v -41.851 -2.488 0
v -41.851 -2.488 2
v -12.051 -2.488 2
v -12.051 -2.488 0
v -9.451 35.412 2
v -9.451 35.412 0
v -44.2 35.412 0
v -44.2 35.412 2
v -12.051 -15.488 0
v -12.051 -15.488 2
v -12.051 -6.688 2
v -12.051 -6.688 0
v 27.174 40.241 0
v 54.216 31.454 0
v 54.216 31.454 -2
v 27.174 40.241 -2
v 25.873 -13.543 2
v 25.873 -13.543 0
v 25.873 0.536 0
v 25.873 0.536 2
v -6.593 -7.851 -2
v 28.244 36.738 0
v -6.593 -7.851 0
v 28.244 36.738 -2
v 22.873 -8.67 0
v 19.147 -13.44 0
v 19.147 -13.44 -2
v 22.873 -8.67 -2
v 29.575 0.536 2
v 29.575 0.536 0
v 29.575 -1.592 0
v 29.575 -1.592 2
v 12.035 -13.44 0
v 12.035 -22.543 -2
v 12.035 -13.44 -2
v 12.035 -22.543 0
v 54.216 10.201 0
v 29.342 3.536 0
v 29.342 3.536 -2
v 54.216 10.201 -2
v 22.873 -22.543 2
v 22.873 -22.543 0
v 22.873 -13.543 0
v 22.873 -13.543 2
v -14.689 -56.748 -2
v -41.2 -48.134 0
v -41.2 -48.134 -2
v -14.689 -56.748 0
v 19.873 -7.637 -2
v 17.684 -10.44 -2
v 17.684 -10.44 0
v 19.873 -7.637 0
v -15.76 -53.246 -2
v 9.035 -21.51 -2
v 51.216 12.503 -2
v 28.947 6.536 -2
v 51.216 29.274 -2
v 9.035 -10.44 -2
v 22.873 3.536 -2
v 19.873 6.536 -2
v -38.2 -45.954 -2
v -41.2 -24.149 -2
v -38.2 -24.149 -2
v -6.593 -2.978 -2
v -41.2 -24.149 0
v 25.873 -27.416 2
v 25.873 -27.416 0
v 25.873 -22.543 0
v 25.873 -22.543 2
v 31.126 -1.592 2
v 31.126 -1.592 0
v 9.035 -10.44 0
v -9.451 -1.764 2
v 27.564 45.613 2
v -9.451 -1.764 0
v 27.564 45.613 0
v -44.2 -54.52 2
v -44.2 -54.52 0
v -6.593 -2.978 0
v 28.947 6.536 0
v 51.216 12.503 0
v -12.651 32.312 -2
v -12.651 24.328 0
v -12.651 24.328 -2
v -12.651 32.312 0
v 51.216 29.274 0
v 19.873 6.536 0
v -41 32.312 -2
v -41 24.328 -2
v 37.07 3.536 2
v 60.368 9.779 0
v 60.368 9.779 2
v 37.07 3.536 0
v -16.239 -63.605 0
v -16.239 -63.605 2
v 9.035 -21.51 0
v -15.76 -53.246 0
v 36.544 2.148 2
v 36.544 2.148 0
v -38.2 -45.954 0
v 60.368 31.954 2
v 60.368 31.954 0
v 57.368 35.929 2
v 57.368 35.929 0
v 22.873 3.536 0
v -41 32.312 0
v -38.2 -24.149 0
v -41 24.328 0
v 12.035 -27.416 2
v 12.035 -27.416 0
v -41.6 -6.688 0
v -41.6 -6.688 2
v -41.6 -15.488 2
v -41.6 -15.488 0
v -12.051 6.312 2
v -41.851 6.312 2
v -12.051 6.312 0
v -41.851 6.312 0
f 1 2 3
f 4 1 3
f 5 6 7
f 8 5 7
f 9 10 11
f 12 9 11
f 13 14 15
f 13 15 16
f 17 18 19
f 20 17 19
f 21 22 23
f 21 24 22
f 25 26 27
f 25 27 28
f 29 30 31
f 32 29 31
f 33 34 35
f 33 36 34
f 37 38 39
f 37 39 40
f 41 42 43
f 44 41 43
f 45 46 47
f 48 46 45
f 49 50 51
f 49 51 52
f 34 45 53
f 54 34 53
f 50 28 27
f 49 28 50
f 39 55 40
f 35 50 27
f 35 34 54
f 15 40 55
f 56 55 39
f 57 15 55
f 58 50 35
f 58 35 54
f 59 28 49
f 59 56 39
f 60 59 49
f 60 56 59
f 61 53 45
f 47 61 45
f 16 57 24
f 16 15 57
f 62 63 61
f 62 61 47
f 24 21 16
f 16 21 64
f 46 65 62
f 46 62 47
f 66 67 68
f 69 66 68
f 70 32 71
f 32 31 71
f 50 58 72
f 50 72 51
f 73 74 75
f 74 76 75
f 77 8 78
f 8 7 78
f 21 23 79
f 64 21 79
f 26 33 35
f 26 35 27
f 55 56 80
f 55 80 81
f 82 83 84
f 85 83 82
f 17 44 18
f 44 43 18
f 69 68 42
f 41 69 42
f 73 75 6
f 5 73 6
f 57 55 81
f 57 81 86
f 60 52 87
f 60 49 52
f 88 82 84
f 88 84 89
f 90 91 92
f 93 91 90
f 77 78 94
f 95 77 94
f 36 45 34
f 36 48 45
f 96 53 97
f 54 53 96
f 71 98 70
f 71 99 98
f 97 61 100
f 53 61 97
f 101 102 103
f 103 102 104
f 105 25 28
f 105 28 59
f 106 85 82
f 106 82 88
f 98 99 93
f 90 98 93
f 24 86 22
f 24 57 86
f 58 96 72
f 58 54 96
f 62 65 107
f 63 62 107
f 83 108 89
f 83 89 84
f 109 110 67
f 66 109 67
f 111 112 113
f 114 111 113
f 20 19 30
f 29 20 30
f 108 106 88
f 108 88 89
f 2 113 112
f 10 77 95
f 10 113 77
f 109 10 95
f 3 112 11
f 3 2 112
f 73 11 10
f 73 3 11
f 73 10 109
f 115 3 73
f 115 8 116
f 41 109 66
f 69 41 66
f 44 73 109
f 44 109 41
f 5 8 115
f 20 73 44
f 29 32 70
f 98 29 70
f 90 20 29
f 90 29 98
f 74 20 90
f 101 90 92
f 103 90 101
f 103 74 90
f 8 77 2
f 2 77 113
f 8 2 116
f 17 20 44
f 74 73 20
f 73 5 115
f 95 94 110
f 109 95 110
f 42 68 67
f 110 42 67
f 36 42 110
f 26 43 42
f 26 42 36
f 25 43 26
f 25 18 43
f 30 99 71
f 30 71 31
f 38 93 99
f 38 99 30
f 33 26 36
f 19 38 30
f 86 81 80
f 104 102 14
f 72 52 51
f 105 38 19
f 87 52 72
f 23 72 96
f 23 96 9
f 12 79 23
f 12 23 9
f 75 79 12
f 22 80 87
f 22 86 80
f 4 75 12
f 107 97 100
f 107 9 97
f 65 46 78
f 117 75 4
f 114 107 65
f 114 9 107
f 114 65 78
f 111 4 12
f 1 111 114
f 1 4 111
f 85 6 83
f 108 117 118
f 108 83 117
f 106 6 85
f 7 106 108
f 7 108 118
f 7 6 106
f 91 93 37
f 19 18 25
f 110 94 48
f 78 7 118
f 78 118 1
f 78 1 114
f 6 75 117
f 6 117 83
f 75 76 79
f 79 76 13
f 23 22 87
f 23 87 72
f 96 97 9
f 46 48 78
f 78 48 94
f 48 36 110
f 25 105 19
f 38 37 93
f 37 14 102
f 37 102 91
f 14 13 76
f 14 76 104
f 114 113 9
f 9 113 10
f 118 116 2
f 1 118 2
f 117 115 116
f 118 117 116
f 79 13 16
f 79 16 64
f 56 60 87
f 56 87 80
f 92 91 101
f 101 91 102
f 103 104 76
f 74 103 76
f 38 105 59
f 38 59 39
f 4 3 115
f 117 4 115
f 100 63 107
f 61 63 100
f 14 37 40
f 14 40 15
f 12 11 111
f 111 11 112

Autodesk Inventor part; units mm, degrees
ref_plane "YZ Plane" through (0, 0, 0) normal (1, 0, 0) x (0, 1, 0)
ref_plane "XZ Plane" through (0, 0, 0) normal (0, 1, 0) x (-1, 0, 0)
ref_plane "XY Plane" through (0, 0, 0) normal (0, 0, 1) x (1, 0, 0)
ref_plane "Work Plane1" through (0, 0, 0) normal (0, 0, 1) x (1, 0, 0)
sketch "Sketch1" plane through (0, 0, 0) normal (0, 0, 1) x (1, 0, 0)
  line L0 (29.3421, 3.5361) -> (54.2162, 10.2011) projected
  line L1 (29.3421, 3.5361) -> (22.8734, 3.5361) projected
  line L2 (22.8734, 3.5361) -> (22.8734, -8.6704) projected
  line L3 (22.8734, -8.6704) -> (19.1468, -13.4402) projected
  line L4 (19.1468, -13.4402) -> (12.0348, -13.4402) projected
  line L5 (12.0348, -13.4402) -> (12.0348, -22.5432) projected
  line L6 (12.0348, -22.5432) -> (-14.689, -56.7481) projected
  line L7 (-14.689, -56.7481) -> (-41.2, -48.1342) projected
  line L8 (-41.2, -48.1342) -> (-41.2, -18.0876) projected
  line L9 (-41.2, -7.0876) -> (-38.2, -7.0876) projected
  line L10 (-38.2, -7.0876) -> (-38.2, -2.0876) projected
  line L11 (-38.2, -2.0876) -> (-41.4512, -2.0876) projected
  line L12 (-41.4512, -2.0876) -> (-41.4512, 5.4124) construction
  line L13 (-41.4512, 5.4124) -> (-41.2, 5.4124) construction
  line L14 (-41.2, 5.4124) -> (-41.2, 5.9124) construction
  line L15 (-41.2, 5.9124) -> (-38.2, 5.9124) projected
  line L16 (-38.2, 5.9124) -> (-38.2, 8.4124) projected
  line L17 (-38.2, 8.4124) -> (-41.2, 8.4124) projected
  line L18 (-41.2, 8.4124) -> (-41.2, 32.4124) projected
  line L19 (-41.2, 32.4124) -> (-12.4512, 32.4124) projected
  line L20 (-12.4512, 32.4124) -> (-12.4512, 8.4124) projected
  line L21 (-12.4512, 8.4124) -> (-15.4512, 8.4124) projected
  line L22 (-15.4512, 8.4124) -> (-15.4512, 5.9124) projected
  line L23 (-15.4512, 5.9124) -> (-12.4512, 5.9124) projected
  line L24 (-12.4512, 5.9124) -> (-12.4512, -2.0876) projected
  line L25 (-12.4512, -2.0876) -> (-15.4512, -2.0876) projected
  line L26 (-15.4512, -2.0876) -> (-15.4512, -7.0876) projected
  line L27 (-15.4512, -7.0876) -> (-12.4512, -7.0876) projected
  line L28 (-12.4512, -7.0876) -> (-12.4512, -15.0876) projected
  line L29 (-10.7358, -8.2808) -> (27.1735, 40.2407) projected
  line L30 (27.1735, 40.2407) -> (54.2162, 31.454) projected
  line L31 (54.2162, 31.454) -> (54.2162, 10.2011) projected
  line L32 (36.5437, 2.1484) -> (31.1264, -1.592) projected
  line L33 (36.5437, 2.1484) -> (37.0695, 3.5361) projected
  line L34 (60.3683, 9.779) -> (37.0695, 3.5361) projected
  line L35 (60.3683, 9.779) -> (60.3683, 9.784) projected
  line L36 (60.3683, 9.784) -> (60.3683, 25.084) projected
  line L37 (60.3683, 25.084) -> (60.3683, 31.9539) projected
  line L38 (60.3683, 31.9539) -> (57.3683, 35.9287) projected
  line L39 (57.3683, 35.9287) -> (27.5635, 45.6128) projected
  line L40 (27.5635, 45.6128) -> (-9.4512, -1.7639) projected
  line L41 (-9.4512, -1.7639) -> (-9.4512, 35.4124) projected
  line L42 (-9.4512, 35.4124) -> (-42.2, 35.4124) projected
  line L43 (-42.2, 35.4124) -> (-44.2, 35.4124) projected
  line L44 (-44.2, 35.4124) -> (-44.2, -54.5196) projected
  line L45 (-44.2, -54.5196) -> (-16.239, -63.6047) projected
  line L46 (-16.239, -63.6047) -> (12.0348, -27.416) projected
  line L47 (12.0348, -27.416) -> (25.8734, -27.416) projected
  line L48 (25.8734, -27.416) -> (25.8734, -22.5432) projected
  line L49 (25.8734, -22.5432) -> (22.8734, -22.5432) projected
  line L50 (22.8734, -22.5432) -> (22.8734, -13.5432) projected
  line L51 (22.8734, -13.5432) -> (25.8734, -13.5432) projected
  line L52 (25.8734, -13.5432) -> (25.8734, 0.5361) projected
  line L53 (25.8734, 0.5361) -> (29.5751, 0.5361) projected
  line L54 (29.5751, 0.5361) -> (29.5751, -1.592) projected
  line L55 (29.5751, -1.592) -> (31.1264, -1.592) projected
  line L56 (-12.4512, 5.9124) -> (-41.4512, 5.9124)
  line L57 (-41.4512, 5.9124) -> (-41.4512, -2.0876) construction
  line L58 (-41.4512, -2.0876) -> (-12.4512, -2.0876)
  line L59 (-12.4512, -2.0876) -> (-12.4512, 5.9124)
  line L60 (-12.4512, -7.0876) -> (-41.2, -7.0876)
  line L61 (-41.2, -7.0876) -> (-41.2, -15.0876)
  line L62 (-41.2, -15.0876) -> (-12.4512, -15.0876)
  line L63 (-12.4512, -15.0876) -> (-12.4512, -7.0876)
  line L64 (-41.4512, 5.9124) -> (-41.4512, -2.0876)
  line L65 (-41.2, -18.0876) -> (-38.2, -18.0876) projected
  line L66 (-38.2, -18.0876) -> (-38.2, -15.0876) projected
  line L67 (-38.2, -15.0876) -> (-41.2, -15.0876) projected
  line L68 (-41.2, -15.0876) -> (-41.2, -7.0876) projected
  line L69 (-12.4512, -15.0876) -> (-14.4512, -15.0876) projected
  line L70 (-14.4512, -15.0876) -> (-14.4512, -17.0876) projected
  line L71 (-14.4512, -17.0876) -> (-10.7358, -17.0876) projected
  line L72 (-10.7358, -17.0876) -> (-10.7358, -8.2808) projected
  point P0 (0, 0)
  dimension "d0" = 8
extrude "Extrusion1" add sketch "Sketch1" along normal blind 2 contours L1 L2 L3 L4 L5 L6 L7 L8 L65 L66 L62 L70 L71 L72 L29 L30 L31 L0 | L60 L10 L58 L26 | L56 L16 L17 L18 L19 L20 L21 L22 | L32 L55 L54 L53 L52 L51 L50 L49 L48 L47 L46 L45 L44 L43 L42 L41 L40 L39 L38 L37 L36 L35 L34 L33
sketch "Sketch2" plane through (0, 0, 0) normal (0, 0, -1) x (-1, 0, 0)
  line L0 (12.4512, -15.0876) -> (12.4512, -7.0876) projected
  line L1 (12.4512, -7.0876) -> (41.2, -7.0876) projected
  line L2 (41.2, -7.0876) -> (41.2, -15.0876) projected
  line L3 (41.2, -15.0876) -> (12.4512, -15.0876) projected
  line L4 (41.4512, 5.9124) -> (41.4512, -2.0876) projected
  line L5 (41.4512, -2.0876) -> (12.4512, -2.0876) projected
  line L6 (12.4512, -2.0876) -> (12.4512, 5.9124) projected
  line L7 (12.4512, 5.9124) -> (41.4512, 5.9124) projected
  line L8 (-36.5437, 2.1484) -> (-31.1264, -1.592) projected
  line L9 (-31.1264, -1.592) -> (-29.5751, -1.592) projected
  line L10 (-29.5751, -1.592) -> (-29.5751, 0.5361) projected
  line L11 (-29.5751, 0.5361) -> (-25.8734, 0.5361) projected
  line L12 (-25.8734, 0.5361) -> (-25.8734, -13.5432) projected
  line L13 (-25.8734, -13.5432) -> (-22.8734, -13.5432) projected
  line L14 (-22.8734, -13.5432) -> (-22.8734, -22.5432) projected
  line L15 (-22.8734, -22.5432) -> (-25.8734, -22.5432) projected
  line L16 (-25.8734, -22.5432) -> (-25.8734, -27.416) projected
  line L17 (-25.8734, -27.416) -> (-12.0348, -27.416) projected
  line L18 (-12.0348, -27.416) -> (16.239, -63.6047) projected
  line L19 (16.239, -63.6047) -> (44.2, -54.5196) projected
  line L20 (44.2, -54.5196) -> (44.2, 35.4124) projected
  line L21 (44.2, 35.4124) -> (9.4512, 35.4124) projected
  line L22 (9.4512, 35.4124) -> (9.4512, -1.7639) projected
  line L23 (9.4512, -1.7639) -> (-27.5635, 45.6128) projected
  line L24 (-27.5635, 45.6128) -> (-57.3683, 35.9287) projected
  line L25 (-57.3683, 35.9287) -> (-60.3683, 31.9539) projected
  line L26 (-60.3683, 31.9539) -> (-60.3683, 9.784) projected
  line L27 (-60.3683, 9.784) -> (-60.3683, 9.779) projected
  line L28 (-60.3683, 9.779) -> (-37.0695, 3.5361) projected
  line L29 (-37.0695, 3.5361) -> (-36.5437, 2.1484) projected
  line L30 (-29.3421, 3.5361) -> (-54.2162, 10.2011) projected
  line L31 (-54.2162, 10.2011) -> (-54.2162, 31.454) projected
  line L32 (-54.2162, 31.454) -> (-27.1735, 40.2407) projected
  line L33 (-27.1735, 40.2407) -> (10.7358, -8.2808) projected
  line L34 (12.4512, -15.0876) -> (12.4512, -7.0876) projected
  line L35 (12.4512, -7.0876) -> (15.4512, -7.0876) projected
  line L36 (15.4512, -7.0876) -> (15.4512, -2.0876) projected
  line L37 (15.4512, -2.0876) -> (12.4512, -2.0876) projected
  line L38 (12.4512, -2.0876) -> (12.4512, 5.9124) projected
  line L39 (12.4512, 5.9124) -> (15.4512, 5.9124) projected
  line L40 (15.4512, 5.9124) -> (15.4512, 8.4124) projected
  line L41 (15.4512, 8.4124) -> (12.4512, 8.4124) projected
  line L42 (12.4512, 8.4124) -> (12.4512, 32.4124) projected
  line L43 (12.4512, 32.4124) -> (41.2, 32.4124) projected
  line L44 (41.2, 32.4124) -> (41.2, 8.4124) projected
  line L45 (41.2, 8.4124) -> (38.2, 8.4124) projected
  line L46 (38.2, 8.4124) -> (38.2, 5.9124) projected
  line L47 (38.2, 5.9124) -> (41.2, 5.9124) projected
  line L48 (41.2, 5.9124) -> (41.2, 5.4124) projected
  line L49 (41.2, 5.4124) -> (41.4512, 5.4124) projected
  line L50 (41.4512, 5.4124) -> (41.4512, -2.0876) projected
  line L51 (41.4512, -2.0876) -> (38.2, -2.0876) projected
  line L52 (38.2, -2.0876) -> (38.2, -7.0876) projected
  line L53 (38.2, -7.0876) -> (41.2, -7.0876) projected
  line L54 (41.2, -18.0876) -> (41.2, -48.1342) projected
  line L55 (41.2, -48.1342) -> (14.689, -56.7481) projected
  line L56 (14.689, -56.7481) -> (-12.0348, -22.5432) projected
  line L57 (-12.0348, -22.5432) -> (-12.0348, -13.4402) projected
  line L58 (-12.0348, -13.4402) -> (-19.1468, -13.4402) projected
  line L59 (-19.1468, -13.4402) -> (-22.8734, -8.6704) projected
  line L60 (-22.8734, -8.6704) -> (-22.8734, 3.5361) projected
  line L61 (-22.8734, 3.5361) -> (-29.3421, 3.5361) projected
  circle A0 centre (37.2, 11.8299) radius 1.45 projected
  circle A1 centre (16.4512, 11.8299) radius 1.45 projected
  line L62 (12.6512, -7.0876) -> (12.6512, -11.0573)
  line L63 (12.6512, -11.0573) -> (-27.2448, 40.0073)
  line L64 (-27.2448, 40.0073) -> (-54.0162, 31.3087)
  line L65 (-54.0162, 31.3087) -> (-54.0162, 10.3546)
  line L66 (-54.0162, 10.3546) -> (-29.3158, 3.7361)
  line L67 (-29.3158, 3.7361) -> (-22.6734, 3.7361)
  line L68 (-22.6734, 3.7361) -> (-22.6734, -8.6016)
  line L69 (-22.6734, -8.6016) -> (-19.0493, -13.2402)
  line L70 (-19.0493, -13.2402) -> (-11.8348, -13.2402)
  line L71 (-11.8348, -13.2402) -> (-11.8348, -22.4744)
  line L72 (-11.8348, -22.4744) -> (14.7604, -56.5146)
  line L73 (14.7604, -56.5146) -> (41, -47.9889)
  line L74 (41, -47.9889) -> (41, -7.0876)
  line L75 (12.2936, -10.5996) -> (12.2936, -15.3176)
  line L76 (12.2936, -15.3176) -> (41, -15.3176)
  line L77 (12.6512, 32.3124) -> (41, 32.3124)
  line L78 (41, 32.3124) -> (41, 24.3283)
  line L79 (41, 24.3283) -> (12.6512, 24.3283)
  line L80 (12.6512, 24.3283) -> (12.6512, 32.3124)
  line L81 (41.2, -15.0876) -> (38.2, -15.0876) projected
  line L82 (38.2, -15.0876) -> (38.2, -18.0876) projected
  line L83 (38.2, -18.0876) -> (41.2, -18.0876) projected
  line L84 (10.7358, -8.2808) -> (10.7358, -17.0876) projected
  line L85 (10.7358, -17.0876) -> (14.4512, -17.0876) projected
  line L86 (14.4512, -17.0876) -> (14.4512, -15.0876) projected
  line L87 (14.4512, -15.0876) -> (12.4512, -15.0876) projected
  line L88 (41.2, -7.0876) -> (41.2, -15.0876) projected
  point P0 (0, 0)
  point P1 (12.4512, -10.4765)
  dimension "d3" = 0.2
  dimension "d4" = 7.9841
  dimension "d5" = 0.2
  dimension "d6" = 0.2
  dimension "d7" = 0.1
extrude "Extrusion2" add sketch "Sketch2" along normal blind 2 contours L0 L63 L62 L1 L74 L3 | L0 L1 L62 L63 | L3 L82 L76 L86 | L76 L82 L83 L74 L73 L72 L71 L70 L69 L68 L67 L66 L65 L64 L63 L84 L85 L86 | L63 L64 L65 L66 L67 L68 L69 L70 L71 L72 L73 L74 L83 L54 L55 L56 L57 L58 L59 L60 L61 L30 L31 L32 L33 L84 | L74 L1 L2 L3 | L36 L5 L52 L1 | L77 L78 L79 L80
sketch "Sketch3" plane through (0, 0, -2) normal (0, 0, -1) x (-1, 0, 0)
  line L0 (12.4512, -7.0876) -> (12.4512, -15.0876) projected
  line L1 (10.7358, -8.2808) -> (-27.1735, 40.2407) projected
  line L2 (-27.1735, 40.2407) -> (-54.2162, 31.454) projected
  line L3 (-54.2162, 31.454) -> (-54.2162, 10.2011) projected
  line L4 (-54.2162, 10.2011) -> (-29.3421, 3.5361) projected
  line L5 (-29.3421, 3.5361) -> (-22.8734, 3.5361) projected
  line L6 (-22.8734, 3.5361) -> (-22.8734, -8.6704) projected
  line L7 (-22.8734, -8.6704) -> (-19.1468, -13.4402) projected
  line L8 (-19.1468, -13.4402) -> (-12.0348, -13.4402) projected
  line L9 (-12.0348, -13.4402) -> (-12.0348, -22.5432) projected
  line L10 (-12.0348, -22.5432) -> (14.689, -56.7481) projected
  line L11 (14.689, -56.7481) -> (41.2, -48.1342) projected
  line L12 (41.2, -15.0876) -> (41.2, -7.0876) projected
  line L13 (41.2, -7.0876) -> (38.2, -7.0876) projected
  line L14 (38.2, -7.0876) -> (38.2, -2.0876) projected
  line L15 (38.2, -2.0876) -> (15.4512, -2.0876) projected
  line L16 (15.4512, -2.0876) -> (15.4512, -7.0876) projected
  line L17 (15.4512, -7.0876) -> (12.4512, -7.0876) projected
  line L18 (38.2, -45.9545) -> (15.7598, -53.2458)
  line L19 (15.7598, -53.2458) -> (-9.0348, -21.5102)
  line L20 (-9.0348, -21.5102) -> (-9.0348, -10.4402)
  line L21 (-9.0348, -10.4402) -> (-17.6836, -10.4402)
  line L22 (-17.6836, -10.4402) -> (-19.8734, -7.6374)
  line L23 (-19.8734, -7.6374) -> (-19.8734, 6.5361)
  line L24 (-19.8734, 6.5361) -> (-28.9472, 6.5361)
  line L25 (-28.9472, 6.5361) -> (-51.2162, 12.5031)
  line L26 (-51.2162, 12.5031) -> (-51.2162, 29.2744)
  line L27 (-51.2162, 29.2744) -> (-28.2442, 36.7384)
  line L28 (-28.2442, 36.7384) -> (15.4512, -19.1891)
  line L29 (15.4512, -19.1891) -> (15.4512, -10.0876)
  line L30 (15.4512, -10.0876) -> (18.4512, -10.0876)
  line L31 (18.4512, -10.0876) -> (18.4512, -5.0876)
  line L32 (18.4512, -5.0876) -> (35.2, -5.0876)
  line L33 (35.2, -5.0876) -> (35.2, -10.0876)
  line L34 (35.2, -10.0876) -> (38.2, -10.0876)
  line L35 (38.2, -10.0876) -> (38.2, -45.9545)
  line L36 (12.4512, -15.0876) -> (14.4512, -15.0876) projected
  line L37 (14.4512, -15.0876) -> (14.4512, -17.0876) projected
  line L38 (14.4512, -17.0876) -> (10.7358, -17.0876) projected
  line L39 (10.7358, -17.0876) -> (10.7358, -8.2808) projected
  line L40 (41.2, -48.1342) -> (41.2, -18.0876) projected
  line L41 (41.2, -18.0876) -> (38.2, -18.0876) projected
  line L42 (38.2, -18.0876) -> (38.2, -15.0876) projected
  line L43 (38.2, -15.0876) -> (41.2, -15.0876) projected
  point P0 (0, 0)
  dimension "d10" = 3
extrude "Extrusion3" cut sketch "Sketch3" against normal up to surface (2 mm away) contours L38 L39 L28 | L28 L29 L30 L31 L32 L33 L34 L35 L18 L19 L20 L21 L22 L23 L24 L25 L26 L27 L39 L38
sketch "Sketch4" plane through (0, 0, 2) normal (0, 0, 1) x (1, 0, 0)
  line L0 (-12.4512, -7.0876) -> (-12.4512, -15.0876) projected
  line L1 (-12.4512, -15.0876) -> (-41.2, -15.0876) projected
  line L2 (-41.2, -15.0876) -> (-41.2, -7.0876) projected
  line L3 (-41.2, -7.0876) -> (-12.4512, -7.0876) projected
  line L4 (-41.4512, -2.0876) -> (-41.4512, 5.9124) projected
  line L5 (-41.4512, 5.9124) -> (-12.4512, 5.9124) projected
  line L6 (-12.4512, 5.9124) -> (-12.4512, -2.0876) projected
  line L7 (-12.4512, -2.0876) -> (-41.4512, -2.0876) projected
  line L8 (31.1264, -1.592) -> (36.5437, 2.1484) projected
  line L9 (36.5437, 2.1484) -> (37.0695, 3.5361) projected
  line L10 (37.0695, 3.5361) -> (60.3683, 9.779) projected
  line L11 (60.3683, 9.779) -> (60.3683, 9.784) projected
  line L12 (60.3683, 9.784) -> (60.3683, 31.9539) projected
  line L13 (60.3683, 31.9539) -> (57.3683, 35.9287) projected
  line L14 (57.3683, 35.9287) -> (27.5635, 45.6128) projected
  line L15 (27.5635, 45.6128) -> (-9.4512, -1.7639) projected
  line L16 (-9.4512, -1.7639) -> (-9.4512, 35.4124) projected
  line L17 (-9.4512, 35.4124) -> (-44.2, 35.4124) projected
  line L18 (-44.2, 35.4124) -> (-44.2, -54.5196) projected
  line L19 (-44.2, -54.5196) -> (-16.239, -63.6047) projected
  line L20 (-16.239, -63.6047) -> (12.0348, -27.416) projected
  line L21 (12.0348, -27.416) -> (25.8734, -27.416) projected
  line L22 (25.8734, -27.416) -> (25.8734, -22.5432) projected
  line L23 (25.8734, -22.5432) -> (22.8734, -22.5432) projected
  line L24 (22.8734, -22.5432) -> (22.8734, -13.5432) projected
  line L25 (22.8734, -13.5432) -> (25.8734, -13.5432) projected
  line L26 (25.8734, -13.5432) -> (25.8734, 0.5361) projected
  line L27 (25.8734, 0.5361) -> (29.5751, 0.5361) projected
  line L28 (29.5751, 0.5361) -> (29.5751, -1.592) projected
  line L29 (29.5751, -1.592) -> (31.1264, -1.592) projected
  line L30 (-41.6, -6.6876) -> (-41.6, -15.4876)
  line L31 (-41.6, -15.4876) -> (-12.0512, -15.4876)
  line L32 (-12.0512, -15.4876) -> (-12.0512, -6.6876)
  line L33 (-12.0512, -6.6876) -> (-41.6, -6.6876)
  line L34 (-41.8512, 6.3124) -> (-41.8512, -2.4876)
  line L35 (-41.8512, -2.4876) -> (-12.0512, -2.4876)
  line L36 (-12.0512, -2.4876) -> (-12.0512, 6.3124)
  line L37 (-12.0512, 6.3124) -> (-41.8512, 6.3124)
  point P0 (0, 0)
  dimension "d13" = 0.4
  dimension "d14" = 0.4
extrude "Extrusion4" cut sketch "Sketch4" against normal through all contours L0 L1 L2 L3 | L4 L5 L6 L7 | L33 L32 L31 L30 | L37 L36 L35 L34
sketch "Sketch5" plane through (28.9472, 6.5361, 0) normal (0, 0, -1) x (-1, 0, 0)
  line L0 (40.9984, -22.0237) -> (40.9984, -13.2237) projected
  line L1 (44.3984, -25.7253) -> (42.7564, -23.6237) projected
  line L2 (0.703, 30.2023) -> (-22.269, 22.7383) projected
  line L3 (-22.269, 22.7383) -> (-22.269, 5.967) projected
  line L4 (-22.269, 5.967) -> (0, 0) projected
  line L5 (0, 0) -> (9.0738, 0) projected
  line L6 (9.0738, 0) -> (9.0738, -14.1736) projected
  line L7 (9.0738, -14.1736) -> (11.2636, -16.9764) projected
  line L8 (11.2636, -16.9764) -> (19.9124, -16.9764) projected
  line L9 (19.9124, -16.9764) -> (19.9124, -28.0464) projected
  line L10 (19.9124, -28.0464) -> (44.707, -59.7819) projected
  line L11 (44.707, -59.7819) -> (67.1472, -52.4907) projected
  line L12 (67.1472, -52.4907) -> (67.1472, -24.6237) projected
  line L13 (43.3984, -22.0237) -> (40.9984, -22.0237) projected
  line L14 (44.3984, -22.0237) -> (44.3984, -25.7253) projected
  line L15 (39.6829, -19.6898) -> (0.703, 30.2023) projected
  line L16 (70.5472, -22.0237) -> (44.3984, -22.0237) projected
  line L17 (82.7759, -30.6849) -> (35.5398, -30.6849)
  line L18 (35.5398, -30.6849) -> (35.5398, 1.4585)
  line L19 (35.5398, 1.4585) -> (82.7759, 1.4585)
  line L20 (82.7759, 1.4585) -> (82.7759, -30.6849)
  line L21 (40.9984, -13.2237) -> (44.3984, -13.2237) projected
  line L22 (44.3984, -13.2237) -> (44.3984, -9.0237) projected
  line L23 (44.3984, -9.0237) -> (40.9984, -9.0237) projected
  line L24 (40.9984, -9.0237) -> (40.9984, -0.2237) projected
  line L25 (40.9984, -0.2237) -> (70.7984, -0.2237) projected
  line L26 (70.7984, -0.2237) -> (70.7984, -9.0237) projected
  line L27 (70.7984, -9.0237) -> (67.1472, -9.0237) projected
  line L28 (67.1472, -9.0237) -> (67.1472, -13.2237) projected
  line L29 (67.1472, -13.2237) -> (70.5472, -13.2237) projected
  line L30 (70.5472, -13.2237) -> (70.5472, -22.0237) projected
  line L31 (42.7564, -23.6237) -> (43.3984, -23.6237) projected
  line L32 (43.3984, -23.6237) -> (43.3984, -22.0237) projected
  line L33 (67.1472, -24.6237) -> (70.1472, -24.6237) projected
  line L34 (70.1472, -24.6237) -> (70.1472, -54.6703) projected
  line L35 (70.1472, -54.6703) -> (43.6362, -63.2842) projected
  line L36 (43.6362, -63.2842) -> (16.9124, -29.0794) projected
  line L37 (16.9124, -29.0794) -> (16.9124, -19.9764) projected
  line L38 (16.9124, -19.9764) -> (9.8004, -19.9764) projected
  line L39 (9.8004, -19.9764) -> (6.0738, -15.2066) projected
  line L40 (6.0738, -15.2066) -> (6.0738, -3) projected
  line L41 (6.0738, -3) -> (-0.395, -3) projected
  line L42 (-0.395, -3) -> (-25.269, 3.665) projected
  line L43 (-25.269, 3.665) -> (-25.269, 24.9179) projected
  line L44 (-25.269, 24.9179) -> (1.7737, 33.7046) projected
  line L45 (1.7737, 33.7046) -> (39.6829, -14.817) projected
  line L46 (39.6829, -14.817) -> (39.6829, -19.6898) projected
  point P0 (28.9472, -6.5361)
extrude "Extrusion5" cut sketch "Sketch5" along normal blind 10 contours L0 L21 L22 L23 L24 L25 L26 L27 L28 L29 L30 L16 L14 L1 L31 L32 L13 | L18 L45 L46 L15 | L15 L46 L45 L18 L19 L20 L17 L34 L33 L12 | L12 L33 L34 L17
properties part number "cellSTORM_v5_microscope_cover"
